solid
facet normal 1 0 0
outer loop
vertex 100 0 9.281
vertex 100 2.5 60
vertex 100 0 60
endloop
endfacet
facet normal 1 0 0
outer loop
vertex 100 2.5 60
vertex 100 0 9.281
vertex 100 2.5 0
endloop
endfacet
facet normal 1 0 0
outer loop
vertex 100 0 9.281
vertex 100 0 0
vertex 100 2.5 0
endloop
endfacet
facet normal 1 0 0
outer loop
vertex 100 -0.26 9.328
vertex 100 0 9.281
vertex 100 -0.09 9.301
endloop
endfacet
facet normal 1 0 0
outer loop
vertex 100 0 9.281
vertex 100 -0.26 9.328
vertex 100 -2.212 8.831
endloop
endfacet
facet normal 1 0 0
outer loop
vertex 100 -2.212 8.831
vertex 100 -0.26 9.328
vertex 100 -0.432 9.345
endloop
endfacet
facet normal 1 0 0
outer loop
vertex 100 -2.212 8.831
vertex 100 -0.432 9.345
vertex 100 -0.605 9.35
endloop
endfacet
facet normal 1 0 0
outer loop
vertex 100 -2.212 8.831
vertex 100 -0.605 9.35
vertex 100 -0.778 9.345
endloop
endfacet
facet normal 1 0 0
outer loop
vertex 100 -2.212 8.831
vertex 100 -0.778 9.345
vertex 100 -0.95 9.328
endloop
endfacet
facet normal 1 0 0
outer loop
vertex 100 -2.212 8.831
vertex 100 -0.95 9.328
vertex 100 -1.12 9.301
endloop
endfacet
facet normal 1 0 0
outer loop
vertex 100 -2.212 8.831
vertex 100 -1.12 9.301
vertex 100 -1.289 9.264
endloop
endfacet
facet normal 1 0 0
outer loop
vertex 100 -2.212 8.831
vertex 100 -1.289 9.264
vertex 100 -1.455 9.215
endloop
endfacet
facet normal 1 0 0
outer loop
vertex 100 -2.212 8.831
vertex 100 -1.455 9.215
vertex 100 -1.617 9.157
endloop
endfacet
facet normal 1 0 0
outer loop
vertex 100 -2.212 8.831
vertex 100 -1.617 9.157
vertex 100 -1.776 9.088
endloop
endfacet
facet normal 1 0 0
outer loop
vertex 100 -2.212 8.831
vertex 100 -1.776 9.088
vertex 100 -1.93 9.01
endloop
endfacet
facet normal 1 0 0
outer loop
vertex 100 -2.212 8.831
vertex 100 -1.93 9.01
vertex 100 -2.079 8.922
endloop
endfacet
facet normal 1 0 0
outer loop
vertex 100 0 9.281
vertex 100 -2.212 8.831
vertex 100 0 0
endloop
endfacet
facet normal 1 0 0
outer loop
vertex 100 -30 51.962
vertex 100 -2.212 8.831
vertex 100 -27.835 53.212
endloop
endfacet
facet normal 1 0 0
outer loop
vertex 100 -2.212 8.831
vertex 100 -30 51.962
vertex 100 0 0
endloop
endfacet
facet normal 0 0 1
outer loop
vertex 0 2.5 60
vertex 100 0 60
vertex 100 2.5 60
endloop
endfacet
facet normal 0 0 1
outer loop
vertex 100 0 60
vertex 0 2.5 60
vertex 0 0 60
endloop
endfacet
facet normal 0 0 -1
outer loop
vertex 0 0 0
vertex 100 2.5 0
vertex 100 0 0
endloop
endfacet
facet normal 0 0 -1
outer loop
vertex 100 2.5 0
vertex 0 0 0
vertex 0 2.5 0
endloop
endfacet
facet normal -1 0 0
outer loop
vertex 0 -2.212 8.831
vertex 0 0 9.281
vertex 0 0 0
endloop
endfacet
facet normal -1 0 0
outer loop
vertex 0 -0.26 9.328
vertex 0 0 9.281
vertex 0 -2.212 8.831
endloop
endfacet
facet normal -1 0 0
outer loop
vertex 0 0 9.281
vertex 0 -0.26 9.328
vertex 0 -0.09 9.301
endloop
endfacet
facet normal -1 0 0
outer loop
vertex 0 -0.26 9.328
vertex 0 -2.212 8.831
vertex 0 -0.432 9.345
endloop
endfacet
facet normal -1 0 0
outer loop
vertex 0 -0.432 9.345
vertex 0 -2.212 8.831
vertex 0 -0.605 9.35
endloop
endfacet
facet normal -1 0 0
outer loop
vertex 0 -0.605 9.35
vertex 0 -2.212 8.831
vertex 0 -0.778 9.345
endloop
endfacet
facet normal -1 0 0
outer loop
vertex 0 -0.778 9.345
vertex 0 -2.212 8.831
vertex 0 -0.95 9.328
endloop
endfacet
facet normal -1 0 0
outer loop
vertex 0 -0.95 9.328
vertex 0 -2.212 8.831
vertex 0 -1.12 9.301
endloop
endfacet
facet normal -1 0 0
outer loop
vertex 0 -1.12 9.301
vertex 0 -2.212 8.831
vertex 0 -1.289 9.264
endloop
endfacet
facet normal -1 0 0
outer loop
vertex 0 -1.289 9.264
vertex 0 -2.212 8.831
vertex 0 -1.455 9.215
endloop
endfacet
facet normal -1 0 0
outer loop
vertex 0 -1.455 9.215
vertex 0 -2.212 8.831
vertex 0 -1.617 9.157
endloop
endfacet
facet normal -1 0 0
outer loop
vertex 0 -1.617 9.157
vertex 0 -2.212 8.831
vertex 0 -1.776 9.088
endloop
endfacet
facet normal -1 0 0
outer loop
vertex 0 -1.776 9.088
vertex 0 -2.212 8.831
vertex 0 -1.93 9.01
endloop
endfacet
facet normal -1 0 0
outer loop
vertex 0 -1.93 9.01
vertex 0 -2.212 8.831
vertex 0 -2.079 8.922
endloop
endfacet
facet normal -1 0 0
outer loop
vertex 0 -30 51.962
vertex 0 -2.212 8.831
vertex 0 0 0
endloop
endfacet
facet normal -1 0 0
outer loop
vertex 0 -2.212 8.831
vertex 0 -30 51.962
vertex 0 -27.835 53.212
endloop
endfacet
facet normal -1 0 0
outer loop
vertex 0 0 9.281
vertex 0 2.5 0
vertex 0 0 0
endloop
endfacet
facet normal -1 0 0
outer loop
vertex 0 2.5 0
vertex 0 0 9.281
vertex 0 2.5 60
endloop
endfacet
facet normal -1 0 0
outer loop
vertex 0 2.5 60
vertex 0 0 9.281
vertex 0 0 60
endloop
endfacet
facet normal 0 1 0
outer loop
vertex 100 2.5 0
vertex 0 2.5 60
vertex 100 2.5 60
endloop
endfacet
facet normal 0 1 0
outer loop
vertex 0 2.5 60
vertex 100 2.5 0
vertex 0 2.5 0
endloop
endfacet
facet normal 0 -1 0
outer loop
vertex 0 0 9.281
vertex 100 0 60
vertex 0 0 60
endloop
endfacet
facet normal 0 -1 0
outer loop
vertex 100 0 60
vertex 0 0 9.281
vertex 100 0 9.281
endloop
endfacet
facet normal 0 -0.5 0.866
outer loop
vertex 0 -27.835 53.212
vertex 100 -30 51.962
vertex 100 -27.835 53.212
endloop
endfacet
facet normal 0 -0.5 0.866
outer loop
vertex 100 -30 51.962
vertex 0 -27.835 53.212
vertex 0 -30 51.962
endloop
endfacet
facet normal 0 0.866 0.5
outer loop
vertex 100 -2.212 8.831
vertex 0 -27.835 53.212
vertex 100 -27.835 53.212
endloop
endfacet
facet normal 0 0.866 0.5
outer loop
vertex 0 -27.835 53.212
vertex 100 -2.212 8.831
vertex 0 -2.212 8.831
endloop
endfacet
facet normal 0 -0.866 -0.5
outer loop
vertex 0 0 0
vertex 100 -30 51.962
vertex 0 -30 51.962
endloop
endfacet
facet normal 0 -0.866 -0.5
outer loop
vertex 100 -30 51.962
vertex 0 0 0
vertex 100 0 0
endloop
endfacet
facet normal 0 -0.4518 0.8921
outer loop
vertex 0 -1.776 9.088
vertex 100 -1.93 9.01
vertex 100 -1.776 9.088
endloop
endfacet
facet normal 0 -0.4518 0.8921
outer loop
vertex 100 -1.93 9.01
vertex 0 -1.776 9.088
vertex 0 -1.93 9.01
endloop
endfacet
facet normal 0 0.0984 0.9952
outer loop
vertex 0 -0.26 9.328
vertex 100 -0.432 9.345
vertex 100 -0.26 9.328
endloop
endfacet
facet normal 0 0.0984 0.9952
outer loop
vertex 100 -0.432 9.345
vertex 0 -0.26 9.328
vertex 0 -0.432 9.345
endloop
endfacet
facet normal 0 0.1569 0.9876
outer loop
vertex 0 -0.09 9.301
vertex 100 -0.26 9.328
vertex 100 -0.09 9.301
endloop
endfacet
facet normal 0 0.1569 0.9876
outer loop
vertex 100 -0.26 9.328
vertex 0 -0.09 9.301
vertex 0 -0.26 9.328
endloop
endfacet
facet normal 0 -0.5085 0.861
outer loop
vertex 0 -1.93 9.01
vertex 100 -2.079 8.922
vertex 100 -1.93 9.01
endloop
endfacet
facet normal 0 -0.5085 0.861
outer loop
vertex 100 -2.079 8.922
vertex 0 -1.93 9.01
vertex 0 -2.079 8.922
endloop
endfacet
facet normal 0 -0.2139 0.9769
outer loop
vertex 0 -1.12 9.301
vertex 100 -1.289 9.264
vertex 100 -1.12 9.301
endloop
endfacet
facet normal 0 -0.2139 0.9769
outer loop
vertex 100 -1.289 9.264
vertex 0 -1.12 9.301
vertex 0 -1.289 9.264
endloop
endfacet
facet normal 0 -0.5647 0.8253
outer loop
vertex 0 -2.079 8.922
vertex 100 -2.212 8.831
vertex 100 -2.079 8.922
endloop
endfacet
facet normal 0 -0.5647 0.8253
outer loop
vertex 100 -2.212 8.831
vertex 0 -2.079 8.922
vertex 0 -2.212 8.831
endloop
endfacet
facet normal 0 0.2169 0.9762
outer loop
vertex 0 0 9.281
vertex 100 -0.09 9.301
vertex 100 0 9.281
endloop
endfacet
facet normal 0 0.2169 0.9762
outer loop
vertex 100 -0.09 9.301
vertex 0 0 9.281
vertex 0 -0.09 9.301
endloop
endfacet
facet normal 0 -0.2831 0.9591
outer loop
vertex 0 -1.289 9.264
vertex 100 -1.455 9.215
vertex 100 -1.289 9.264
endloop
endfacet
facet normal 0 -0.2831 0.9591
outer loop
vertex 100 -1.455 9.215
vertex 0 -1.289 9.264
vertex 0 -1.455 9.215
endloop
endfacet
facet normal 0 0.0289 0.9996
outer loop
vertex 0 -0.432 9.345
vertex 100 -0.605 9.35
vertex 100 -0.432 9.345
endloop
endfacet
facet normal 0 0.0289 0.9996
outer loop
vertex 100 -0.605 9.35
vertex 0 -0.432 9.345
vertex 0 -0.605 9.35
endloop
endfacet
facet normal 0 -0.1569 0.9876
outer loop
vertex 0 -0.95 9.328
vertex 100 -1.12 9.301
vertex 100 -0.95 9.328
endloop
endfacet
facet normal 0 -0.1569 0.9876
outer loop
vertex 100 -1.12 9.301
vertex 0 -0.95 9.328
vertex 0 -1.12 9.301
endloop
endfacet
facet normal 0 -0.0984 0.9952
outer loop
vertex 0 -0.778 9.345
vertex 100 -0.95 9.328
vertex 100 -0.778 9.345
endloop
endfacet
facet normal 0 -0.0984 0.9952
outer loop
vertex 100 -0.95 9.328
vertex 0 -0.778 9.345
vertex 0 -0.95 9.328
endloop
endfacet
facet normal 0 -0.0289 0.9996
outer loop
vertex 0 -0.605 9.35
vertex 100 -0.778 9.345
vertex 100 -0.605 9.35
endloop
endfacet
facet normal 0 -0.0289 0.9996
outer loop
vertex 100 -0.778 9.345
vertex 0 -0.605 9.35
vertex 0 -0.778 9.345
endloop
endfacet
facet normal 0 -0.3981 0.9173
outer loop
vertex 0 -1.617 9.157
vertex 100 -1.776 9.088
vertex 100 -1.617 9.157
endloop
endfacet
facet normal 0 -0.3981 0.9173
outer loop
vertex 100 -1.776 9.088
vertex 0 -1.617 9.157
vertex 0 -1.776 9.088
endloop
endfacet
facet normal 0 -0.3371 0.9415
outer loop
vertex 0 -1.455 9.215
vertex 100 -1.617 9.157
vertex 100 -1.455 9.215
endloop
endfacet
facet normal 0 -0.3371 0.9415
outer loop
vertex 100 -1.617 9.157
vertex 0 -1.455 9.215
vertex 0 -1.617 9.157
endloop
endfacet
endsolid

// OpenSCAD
/*
 * tilting mount for a vario
 */

$fn = 100;

mount_width = 100;
mount_height = 60;
mount_thickness = 2.5;

module mount_plane() {
   cube([mount_width, mount_thickness, mount_height]);
}

module reenforcer() {
   radius = mount_thickness*1.1;
   translate([0, -radius*0.22, 2.4*radius]) {
      rotate([0, 90, 0]) {
         cylinder(r=radius, h=mount_width);
      }
   }
}

module render_mount(mount_angle) {
   mount_plane();
   rotate([mount_angle, 0, 0]) {
      mount_plane();
   }
   reenforcer();
}

module render_mounts() {
   render_mount(30);
}

render_mounts();
